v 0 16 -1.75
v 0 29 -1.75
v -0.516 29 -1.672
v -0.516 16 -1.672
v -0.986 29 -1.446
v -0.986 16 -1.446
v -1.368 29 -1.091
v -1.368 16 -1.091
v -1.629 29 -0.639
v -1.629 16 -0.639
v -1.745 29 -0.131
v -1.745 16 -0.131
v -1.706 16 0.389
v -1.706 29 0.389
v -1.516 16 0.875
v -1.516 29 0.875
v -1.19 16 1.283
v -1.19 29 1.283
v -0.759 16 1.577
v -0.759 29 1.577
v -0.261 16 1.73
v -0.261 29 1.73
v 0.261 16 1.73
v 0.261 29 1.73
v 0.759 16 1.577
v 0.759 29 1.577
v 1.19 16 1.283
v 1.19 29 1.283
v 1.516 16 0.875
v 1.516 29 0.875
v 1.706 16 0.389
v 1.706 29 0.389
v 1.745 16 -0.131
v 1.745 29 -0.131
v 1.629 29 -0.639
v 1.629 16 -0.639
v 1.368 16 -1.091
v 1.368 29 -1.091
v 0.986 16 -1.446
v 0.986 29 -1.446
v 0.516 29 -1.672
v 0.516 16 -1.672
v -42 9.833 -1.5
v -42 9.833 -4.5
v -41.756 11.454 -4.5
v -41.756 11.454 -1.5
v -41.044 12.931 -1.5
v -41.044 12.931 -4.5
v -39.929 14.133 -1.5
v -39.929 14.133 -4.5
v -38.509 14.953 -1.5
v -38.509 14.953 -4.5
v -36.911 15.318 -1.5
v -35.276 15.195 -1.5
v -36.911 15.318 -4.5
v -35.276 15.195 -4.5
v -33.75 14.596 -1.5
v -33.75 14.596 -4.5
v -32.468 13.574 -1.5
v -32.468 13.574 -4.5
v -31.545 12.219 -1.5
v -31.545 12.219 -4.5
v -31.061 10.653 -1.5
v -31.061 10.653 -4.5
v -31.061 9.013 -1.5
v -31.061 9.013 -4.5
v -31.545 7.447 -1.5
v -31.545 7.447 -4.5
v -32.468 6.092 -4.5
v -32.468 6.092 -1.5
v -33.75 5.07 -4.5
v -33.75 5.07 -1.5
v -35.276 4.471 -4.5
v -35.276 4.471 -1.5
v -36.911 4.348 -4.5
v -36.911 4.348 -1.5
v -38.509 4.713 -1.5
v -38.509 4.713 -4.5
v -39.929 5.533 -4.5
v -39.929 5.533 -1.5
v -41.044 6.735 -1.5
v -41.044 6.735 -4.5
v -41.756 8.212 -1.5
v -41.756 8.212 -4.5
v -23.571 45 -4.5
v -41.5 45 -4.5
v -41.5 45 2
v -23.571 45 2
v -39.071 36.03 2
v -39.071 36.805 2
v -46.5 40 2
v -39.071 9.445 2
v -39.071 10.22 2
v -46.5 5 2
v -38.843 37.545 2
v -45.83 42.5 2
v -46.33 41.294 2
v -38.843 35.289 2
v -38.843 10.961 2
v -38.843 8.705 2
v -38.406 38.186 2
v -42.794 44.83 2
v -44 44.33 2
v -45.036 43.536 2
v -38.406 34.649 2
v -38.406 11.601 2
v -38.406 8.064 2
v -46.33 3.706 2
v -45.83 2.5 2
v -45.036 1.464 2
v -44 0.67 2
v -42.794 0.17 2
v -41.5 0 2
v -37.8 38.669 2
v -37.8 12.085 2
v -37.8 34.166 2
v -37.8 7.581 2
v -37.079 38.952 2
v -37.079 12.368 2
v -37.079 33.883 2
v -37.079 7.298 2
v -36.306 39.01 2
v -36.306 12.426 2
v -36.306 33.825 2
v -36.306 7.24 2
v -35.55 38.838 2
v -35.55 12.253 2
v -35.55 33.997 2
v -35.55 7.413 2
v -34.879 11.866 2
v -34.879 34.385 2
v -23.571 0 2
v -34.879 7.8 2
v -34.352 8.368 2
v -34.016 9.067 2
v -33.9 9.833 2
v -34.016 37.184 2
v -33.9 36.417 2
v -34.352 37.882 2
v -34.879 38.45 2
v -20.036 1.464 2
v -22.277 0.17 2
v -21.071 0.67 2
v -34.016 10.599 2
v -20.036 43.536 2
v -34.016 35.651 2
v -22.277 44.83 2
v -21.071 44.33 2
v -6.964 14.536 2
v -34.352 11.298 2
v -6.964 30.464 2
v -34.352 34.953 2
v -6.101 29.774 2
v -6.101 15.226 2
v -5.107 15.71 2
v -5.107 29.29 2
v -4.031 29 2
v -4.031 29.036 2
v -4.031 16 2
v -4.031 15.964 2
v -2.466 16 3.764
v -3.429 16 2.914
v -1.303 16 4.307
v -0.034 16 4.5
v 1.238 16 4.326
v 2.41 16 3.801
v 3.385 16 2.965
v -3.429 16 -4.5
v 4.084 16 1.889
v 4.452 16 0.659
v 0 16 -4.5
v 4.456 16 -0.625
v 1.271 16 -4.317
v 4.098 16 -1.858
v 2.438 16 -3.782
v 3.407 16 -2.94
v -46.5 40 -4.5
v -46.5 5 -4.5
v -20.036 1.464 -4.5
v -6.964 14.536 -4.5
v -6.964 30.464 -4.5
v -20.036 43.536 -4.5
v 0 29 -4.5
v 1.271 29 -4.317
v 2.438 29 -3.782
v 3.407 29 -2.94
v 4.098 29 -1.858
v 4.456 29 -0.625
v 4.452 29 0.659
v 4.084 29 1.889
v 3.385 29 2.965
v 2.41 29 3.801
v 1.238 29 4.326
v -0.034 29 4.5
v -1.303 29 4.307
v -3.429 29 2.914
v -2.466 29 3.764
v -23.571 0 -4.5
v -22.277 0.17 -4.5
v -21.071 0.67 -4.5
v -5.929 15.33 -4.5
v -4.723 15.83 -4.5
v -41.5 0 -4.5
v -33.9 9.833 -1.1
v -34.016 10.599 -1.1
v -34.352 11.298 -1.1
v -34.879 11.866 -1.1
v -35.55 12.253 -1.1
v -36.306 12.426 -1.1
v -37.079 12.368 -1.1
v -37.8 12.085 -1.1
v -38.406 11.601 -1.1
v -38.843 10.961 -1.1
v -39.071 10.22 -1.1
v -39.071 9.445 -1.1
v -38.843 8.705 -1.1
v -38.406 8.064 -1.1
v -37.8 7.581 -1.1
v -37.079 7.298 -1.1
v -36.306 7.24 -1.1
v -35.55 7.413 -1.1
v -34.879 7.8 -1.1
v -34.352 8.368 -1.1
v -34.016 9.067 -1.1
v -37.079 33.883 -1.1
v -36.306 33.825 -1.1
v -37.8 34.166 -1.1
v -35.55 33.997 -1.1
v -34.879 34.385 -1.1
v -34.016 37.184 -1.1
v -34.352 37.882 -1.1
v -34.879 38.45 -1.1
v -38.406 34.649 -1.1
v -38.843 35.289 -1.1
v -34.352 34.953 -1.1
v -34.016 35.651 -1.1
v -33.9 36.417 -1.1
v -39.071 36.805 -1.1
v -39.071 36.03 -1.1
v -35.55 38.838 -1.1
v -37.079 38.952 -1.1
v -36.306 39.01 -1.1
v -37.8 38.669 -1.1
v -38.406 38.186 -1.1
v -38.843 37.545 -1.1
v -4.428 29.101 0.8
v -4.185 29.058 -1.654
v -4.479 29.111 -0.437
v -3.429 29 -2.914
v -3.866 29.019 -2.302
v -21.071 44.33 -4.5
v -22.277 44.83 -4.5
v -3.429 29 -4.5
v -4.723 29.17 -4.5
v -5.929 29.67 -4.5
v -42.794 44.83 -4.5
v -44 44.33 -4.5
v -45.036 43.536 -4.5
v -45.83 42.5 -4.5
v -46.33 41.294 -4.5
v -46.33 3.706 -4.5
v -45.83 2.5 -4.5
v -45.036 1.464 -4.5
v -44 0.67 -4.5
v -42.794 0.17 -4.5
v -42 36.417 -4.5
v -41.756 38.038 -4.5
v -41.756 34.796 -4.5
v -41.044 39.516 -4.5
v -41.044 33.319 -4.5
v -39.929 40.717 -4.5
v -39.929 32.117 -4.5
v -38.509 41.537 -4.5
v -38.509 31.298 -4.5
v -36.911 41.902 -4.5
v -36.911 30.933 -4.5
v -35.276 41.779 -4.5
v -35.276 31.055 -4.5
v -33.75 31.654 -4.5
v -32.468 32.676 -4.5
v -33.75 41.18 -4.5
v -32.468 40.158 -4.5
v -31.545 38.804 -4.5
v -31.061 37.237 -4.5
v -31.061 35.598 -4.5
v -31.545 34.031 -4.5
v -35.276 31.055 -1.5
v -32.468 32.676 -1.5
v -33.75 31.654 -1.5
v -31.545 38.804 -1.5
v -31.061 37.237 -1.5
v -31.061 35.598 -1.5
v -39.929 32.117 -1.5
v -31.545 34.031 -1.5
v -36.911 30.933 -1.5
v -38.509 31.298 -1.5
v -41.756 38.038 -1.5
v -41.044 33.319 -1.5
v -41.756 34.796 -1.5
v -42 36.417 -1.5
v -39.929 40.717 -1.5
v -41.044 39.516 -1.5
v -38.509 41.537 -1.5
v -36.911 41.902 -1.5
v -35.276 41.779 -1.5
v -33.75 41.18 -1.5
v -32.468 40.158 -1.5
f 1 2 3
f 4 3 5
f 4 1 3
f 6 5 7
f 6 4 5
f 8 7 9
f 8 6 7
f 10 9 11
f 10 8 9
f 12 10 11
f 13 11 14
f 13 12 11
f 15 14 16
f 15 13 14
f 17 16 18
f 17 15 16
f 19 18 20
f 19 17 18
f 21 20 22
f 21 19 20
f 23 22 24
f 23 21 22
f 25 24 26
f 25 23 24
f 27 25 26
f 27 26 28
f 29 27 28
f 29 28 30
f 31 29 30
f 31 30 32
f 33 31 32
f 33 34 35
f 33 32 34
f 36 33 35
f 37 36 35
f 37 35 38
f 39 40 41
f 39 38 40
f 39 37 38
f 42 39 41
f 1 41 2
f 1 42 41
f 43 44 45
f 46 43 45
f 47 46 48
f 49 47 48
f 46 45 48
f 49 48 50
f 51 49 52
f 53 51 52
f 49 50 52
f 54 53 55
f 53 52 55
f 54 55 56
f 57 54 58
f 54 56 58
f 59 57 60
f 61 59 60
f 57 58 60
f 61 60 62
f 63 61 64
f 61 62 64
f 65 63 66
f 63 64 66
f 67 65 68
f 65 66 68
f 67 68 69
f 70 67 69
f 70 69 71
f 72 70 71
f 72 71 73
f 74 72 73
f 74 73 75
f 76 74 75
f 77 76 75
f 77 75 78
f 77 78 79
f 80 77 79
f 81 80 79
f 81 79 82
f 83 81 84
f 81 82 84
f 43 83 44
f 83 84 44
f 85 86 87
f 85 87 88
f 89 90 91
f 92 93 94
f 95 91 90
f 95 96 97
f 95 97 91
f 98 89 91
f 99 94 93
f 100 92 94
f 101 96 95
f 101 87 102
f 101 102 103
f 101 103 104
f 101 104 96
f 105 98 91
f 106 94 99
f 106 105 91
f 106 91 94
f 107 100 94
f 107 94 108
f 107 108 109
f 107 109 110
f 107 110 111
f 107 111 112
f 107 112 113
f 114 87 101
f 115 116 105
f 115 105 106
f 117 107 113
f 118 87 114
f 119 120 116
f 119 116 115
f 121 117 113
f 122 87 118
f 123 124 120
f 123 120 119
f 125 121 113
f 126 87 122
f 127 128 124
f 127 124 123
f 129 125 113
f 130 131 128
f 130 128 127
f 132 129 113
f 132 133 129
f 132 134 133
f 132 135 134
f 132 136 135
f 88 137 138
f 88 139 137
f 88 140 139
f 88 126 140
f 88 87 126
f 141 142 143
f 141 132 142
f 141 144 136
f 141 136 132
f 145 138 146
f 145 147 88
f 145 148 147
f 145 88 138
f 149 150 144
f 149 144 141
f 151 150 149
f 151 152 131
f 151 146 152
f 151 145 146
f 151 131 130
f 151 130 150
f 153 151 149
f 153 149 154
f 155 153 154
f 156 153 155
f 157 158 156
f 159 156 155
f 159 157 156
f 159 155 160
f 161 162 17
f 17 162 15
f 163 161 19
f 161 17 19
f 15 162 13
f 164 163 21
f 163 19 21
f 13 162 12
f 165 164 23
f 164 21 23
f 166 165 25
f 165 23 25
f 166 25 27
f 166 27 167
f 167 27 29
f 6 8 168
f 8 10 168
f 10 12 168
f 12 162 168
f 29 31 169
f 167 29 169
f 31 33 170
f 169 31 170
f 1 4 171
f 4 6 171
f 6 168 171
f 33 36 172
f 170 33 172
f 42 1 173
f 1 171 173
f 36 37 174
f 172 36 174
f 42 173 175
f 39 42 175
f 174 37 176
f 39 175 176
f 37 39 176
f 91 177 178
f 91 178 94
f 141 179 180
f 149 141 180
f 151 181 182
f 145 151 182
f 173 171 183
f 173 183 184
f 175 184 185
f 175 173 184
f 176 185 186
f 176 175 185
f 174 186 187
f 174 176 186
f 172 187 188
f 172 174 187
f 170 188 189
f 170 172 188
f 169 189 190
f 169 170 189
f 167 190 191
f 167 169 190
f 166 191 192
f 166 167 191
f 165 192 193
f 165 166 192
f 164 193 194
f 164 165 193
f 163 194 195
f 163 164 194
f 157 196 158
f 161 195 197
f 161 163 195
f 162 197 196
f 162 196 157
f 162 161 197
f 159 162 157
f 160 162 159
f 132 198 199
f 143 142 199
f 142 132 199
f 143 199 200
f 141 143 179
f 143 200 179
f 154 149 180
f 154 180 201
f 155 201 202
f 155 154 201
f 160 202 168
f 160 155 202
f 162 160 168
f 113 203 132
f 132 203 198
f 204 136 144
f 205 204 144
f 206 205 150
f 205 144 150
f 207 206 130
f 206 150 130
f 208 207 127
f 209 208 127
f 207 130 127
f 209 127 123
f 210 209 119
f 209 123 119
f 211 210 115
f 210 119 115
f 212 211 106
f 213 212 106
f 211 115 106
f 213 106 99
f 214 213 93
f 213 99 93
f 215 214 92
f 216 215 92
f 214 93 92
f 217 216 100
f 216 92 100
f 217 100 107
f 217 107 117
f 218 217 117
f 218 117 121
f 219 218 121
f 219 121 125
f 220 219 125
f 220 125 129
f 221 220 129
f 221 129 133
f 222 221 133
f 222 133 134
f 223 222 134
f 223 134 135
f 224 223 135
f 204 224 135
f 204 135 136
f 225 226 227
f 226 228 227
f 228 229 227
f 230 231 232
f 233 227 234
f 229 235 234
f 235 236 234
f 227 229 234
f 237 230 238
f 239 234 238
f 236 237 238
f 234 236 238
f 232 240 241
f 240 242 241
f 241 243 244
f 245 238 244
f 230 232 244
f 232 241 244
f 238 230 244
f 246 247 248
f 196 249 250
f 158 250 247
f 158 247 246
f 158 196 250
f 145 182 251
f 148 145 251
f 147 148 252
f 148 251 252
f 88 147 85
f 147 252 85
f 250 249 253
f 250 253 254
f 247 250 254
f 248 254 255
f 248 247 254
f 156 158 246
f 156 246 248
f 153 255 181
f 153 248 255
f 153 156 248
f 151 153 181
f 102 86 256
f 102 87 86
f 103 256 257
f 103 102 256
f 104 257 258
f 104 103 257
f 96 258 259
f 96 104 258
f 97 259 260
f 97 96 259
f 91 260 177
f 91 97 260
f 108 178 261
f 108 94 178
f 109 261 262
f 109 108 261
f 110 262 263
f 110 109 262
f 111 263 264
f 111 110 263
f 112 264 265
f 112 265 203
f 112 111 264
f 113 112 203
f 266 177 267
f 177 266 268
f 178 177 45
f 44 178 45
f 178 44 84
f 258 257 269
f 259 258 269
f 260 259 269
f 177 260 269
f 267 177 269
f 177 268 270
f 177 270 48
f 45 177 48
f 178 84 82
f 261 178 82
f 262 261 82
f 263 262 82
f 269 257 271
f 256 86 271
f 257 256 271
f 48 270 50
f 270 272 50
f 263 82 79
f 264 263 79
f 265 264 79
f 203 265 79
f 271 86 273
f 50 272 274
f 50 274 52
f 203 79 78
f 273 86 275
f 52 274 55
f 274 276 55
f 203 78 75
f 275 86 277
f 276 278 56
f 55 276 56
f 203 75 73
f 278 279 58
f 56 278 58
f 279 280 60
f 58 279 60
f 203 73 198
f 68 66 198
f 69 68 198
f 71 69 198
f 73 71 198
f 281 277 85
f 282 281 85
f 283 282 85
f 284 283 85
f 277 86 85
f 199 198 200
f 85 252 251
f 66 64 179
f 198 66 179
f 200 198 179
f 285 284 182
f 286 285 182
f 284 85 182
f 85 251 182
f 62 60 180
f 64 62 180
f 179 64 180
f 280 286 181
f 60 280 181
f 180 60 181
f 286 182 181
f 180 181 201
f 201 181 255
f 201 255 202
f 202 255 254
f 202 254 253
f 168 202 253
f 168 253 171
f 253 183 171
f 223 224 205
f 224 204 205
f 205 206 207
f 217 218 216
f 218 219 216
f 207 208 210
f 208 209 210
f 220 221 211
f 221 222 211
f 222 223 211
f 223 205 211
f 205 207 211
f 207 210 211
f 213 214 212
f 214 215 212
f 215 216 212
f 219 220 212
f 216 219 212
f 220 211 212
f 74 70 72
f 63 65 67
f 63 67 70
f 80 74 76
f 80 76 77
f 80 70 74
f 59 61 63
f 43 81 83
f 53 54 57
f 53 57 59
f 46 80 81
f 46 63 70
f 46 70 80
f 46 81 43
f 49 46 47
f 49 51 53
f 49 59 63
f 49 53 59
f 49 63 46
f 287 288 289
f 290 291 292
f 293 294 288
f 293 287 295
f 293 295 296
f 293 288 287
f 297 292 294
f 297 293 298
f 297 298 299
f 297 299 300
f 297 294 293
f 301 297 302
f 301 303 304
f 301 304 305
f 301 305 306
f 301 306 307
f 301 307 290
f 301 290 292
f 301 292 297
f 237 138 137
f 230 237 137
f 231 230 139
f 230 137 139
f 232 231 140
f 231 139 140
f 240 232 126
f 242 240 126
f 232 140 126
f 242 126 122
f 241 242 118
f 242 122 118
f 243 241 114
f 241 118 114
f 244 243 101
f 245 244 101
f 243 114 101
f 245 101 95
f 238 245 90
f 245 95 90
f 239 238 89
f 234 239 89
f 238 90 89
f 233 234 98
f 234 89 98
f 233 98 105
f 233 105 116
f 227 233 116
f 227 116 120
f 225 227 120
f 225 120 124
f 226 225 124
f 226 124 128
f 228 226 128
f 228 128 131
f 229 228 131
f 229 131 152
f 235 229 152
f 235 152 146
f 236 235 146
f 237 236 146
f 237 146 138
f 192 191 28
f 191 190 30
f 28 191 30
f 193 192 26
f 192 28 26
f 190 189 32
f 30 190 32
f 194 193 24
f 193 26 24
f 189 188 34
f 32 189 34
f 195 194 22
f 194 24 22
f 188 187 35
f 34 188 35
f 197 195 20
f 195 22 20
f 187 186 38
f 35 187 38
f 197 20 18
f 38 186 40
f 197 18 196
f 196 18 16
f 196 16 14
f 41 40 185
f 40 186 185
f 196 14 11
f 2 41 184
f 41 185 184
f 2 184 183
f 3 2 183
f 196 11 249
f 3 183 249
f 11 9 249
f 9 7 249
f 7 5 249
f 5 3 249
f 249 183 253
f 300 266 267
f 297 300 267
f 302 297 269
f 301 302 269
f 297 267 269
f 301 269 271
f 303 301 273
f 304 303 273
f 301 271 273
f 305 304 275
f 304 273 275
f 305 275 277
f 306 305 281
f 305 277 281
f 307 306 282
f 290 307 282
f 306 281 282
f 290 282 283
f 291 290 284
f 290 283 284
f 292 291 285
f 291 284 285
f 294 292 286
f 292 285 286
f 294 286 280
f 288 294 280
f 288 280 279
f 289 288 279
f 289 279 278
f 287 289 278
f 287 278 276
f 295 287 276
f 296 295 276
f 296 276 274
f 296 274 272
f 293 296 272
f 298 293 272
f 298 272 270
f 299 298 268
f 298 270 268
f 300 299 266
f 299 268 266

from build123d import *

# Parameters (mm, degrees)
BOSS_EXTRUDE1_DEPTH = 45
BOSS_EXTRUDE2_START = 16
SKETCH1_3_R         = 4.5
SKETCH1_3_R_2       = 1.75
BOSS_EXTRUDE2_DEPTH = 13
CUT_EXTRUDE1_START  = 16
SKETCH5_R           = 5.5
CUT_EXTRUDE1_DEPTH  = 25
SKETCH6_R           = 2.6
CUT_EXTRUDE2_DEPTH  = 15
CUT_EXTRUDE4_START  = 49.4
SKETCH5_4_R         = 5.5
CUT_EXTRUDE4_DEPTH  = 20.4
FILLET1_R           = 0.5
FILLET2_R           = 5
SKETCH7_R           = 5.5
CUT_EXTRUDE3_DEPTH  = 3
SKETCH8_R           = 3.001117943
SKETCH8_R_2         = 3.734433125
BOSS_EXTRUDE5_DEPTH = 0.4
SKETCH9_W           = 2.236067978
SKETCH9_H           = 16
CUT_EXTRUDE5_DEPTH  = 10
FILLET4_R           = 5


with BuildPart() as part:
    # Sketch1 → Boss-Extrude1 (new body)
    with BuildSketch(Plane(origin=(0, 0, 0), x_dir=(1, 0, 0), z_dir=(0, 1, 0))):
        with BuildLine():
            Line((-46.5, 4.5), (-46.5, -2))
            Line((-46.5, -2), (-4.031128874, -2))
            ThreePointArc((-4.031128874, -2), (-3.824264635, 2.371708245), (0, 4.5))
            Line((0, 4.5), (-46.5, 4.5))
        make_face()
    extrude(amount=BOSS_EXTRUDE1_DEPTH)

    # Sketch1<3> → Boss-Extrude2 (add)
    # profile 1 of 2: a face of its own
    with BuildSketch(Plane(origin=(0, 0, 0), x_dir=(1, 0, 0), z_dir=(0, 1, 0)).offset(BOSS_EXTRUDE2_START)):
        Circle(SKETCH1_3_R)
        Polygon((-2.857883832, -1.65), (0, -3.3), (2.857883832, -1.65), (2.857883832, 1.65), (0, 3.3), (-2.857883832, 1.65), align=None, mode=Mode.SUBTRACT)
    # profile 2 of 2: a face of its own
    with BuildSketch(Plane(origin=(0, 0, 0), x_dir=(1, 0, 0), z_dir=(0, 1, 0)).offset(BOSS_EXTRUDE2_START)):
        Polygon((-2.857883832, 1.65), (-2.857883832, -1.65), (0, -3.3), (2.857883832, -1.65), (2.857883832, 1.65), (0, 3.3), align=None)
        with Locations(Location((0, 0, 0), (0, 0, 90))):
            Circle(SKETCH1_3_R_2, mode=Mode.SUBTRACT)
    extrude(amount=BOSS_EXTRUDE2_DEPTH)

    # Sketch5 → Cut-Extrude1 (cut)
    with BuildSketch(Plane(origin=(0, 0, 0), x_dir=(1, 0, 0), z_dir=(0, 1, 0)).offset(CUT_EXTRUDE1_START)):
        Circle(SKETCH5_R)
    extrude(amount=-CUT_EXTRUDE1_DEPTH, mode=Mode.SUBTRACT)

    # Sketch6 → Cut-Extrude2 (cut)
    with BuildSketch(Plane.XY.offset(2)):
        with Locations((-36.5, 36.417335992)):
            Circle(SKETCH6_R)
        with Locations((-36.5, 9.832941716)):
            Circle(SKETCH6_R)
    extrude(amount=-CUT_EXTRUDE2_DEPTH, mode=Mode.SUBTRACT)

    # Sketch5<4> → Cut-Extrude4 (cut)
    with BuildSketch(Plane(origin=(0, 0, 0), x_dir=(1, 0, 0), z_dir=(0, 1, 0)).offset(CUT_EXTRUDE4_START)):
        Circle(SKETCH5_4_R)
    extrude(amount=-CUT_EXTRUDE4_DEPTH, mode=Mode.SUBTRACT)

    # Fillet1
    fillet1_edges = [part.edges().sort_by_distance(p)[0] for p in [
        (-3.16227766, 8, -4.5),
    ]]
    fillet(fillet1_edges, radius=FILLET1_R)

    # Fillet2
    fillet2_edges = [part.edges().sort_by_distance(p)[0] for p in [
        (-46.5, 45, -1.25),
        (-46.5, 0, -1.25),
    ]]
    fillet(fillet2_edges, radius=FILLET2_R)

    # Sketch7 → Cut-Extrude3 (cut)
    with BuildSketch(Plane(origin=(0, 0, -4.5), x_dir=(-1, 0, 0), z_dir=(0, 0, -1))):
        with Locations((36.5, 36.417335992)):
            Circle(SKETCH7_R)
        with Locations((36.5, 9.832941716)):
            Circle(SKETCH7_R)
    extrude(amount=-CUT_EXTRUDE3_DEPTH, mode=Mode.SUBTRACT)

    # Sketch8 → Boss-Extrude5 (add)
    with BuildSketch(Plane(origin=(0, 0, -1.5), x_dir=(-1, 0, 0), z_dir=(0, 0, -1))):
        with Locations((36.5, 36.417335992)):
            Circle(SKETCH8_R)
        with Locations((36.5, 9.832941716)):
            Circle(SKETCH8_R_2)
    extrude(amount=-BOSS_EXTRUDE5_DEPTH)

    # Sketch9 → Cut-Extrude5 (cut)
    with BuildSketch(Plane(origin=(0, 0, -4.5), x_dir=(-1, 0, 0), z_dir=(0, 0, -1))):
        Polygon((5.5, 16), (4.472135955, 16), (4.472135955, 0), (21.5, 0), align=None)
        with Locations((3.354101966, 8)):
            Rectangle(SKETCH9_W, SKETCH9_H)
        Polygon((3.16227766, 29), (3.16227766, 45), (-0.050353192, 45), (-0.050353192, 29), (0, 29), align=None)
        Polygon((5.5, 29), (21.5, 45), (3.16227766, 45), (3.16227766, 29), align=None)
    extrude(amount=-CUT_EXTRUDE5_DEPTH, mode=Mode.SUBTRACT)

    # Fillet4
    # the kernel refuses this fillet: 5 mm, written as the material it adds along each edge
    with BuildSketch(Plane(origin=(-5.5, 29, 7.17766953), x_dir=(-0.7071067811865427, 0.7071067811865525, 0), z_dir=(0, 0, -1))) as fillet4_piece_1_section:
        with BuildLine():
            CenterArc((FILLET4_R * 0.414213562373, FILLET4_R), FILLET4_R, 225, 45)
            Line((-FILLET4_R * 0.292893218813, FILLET4_R * 0.292893218813), (0, 0))
            Line((0, 0), (FILLET4_R * 0.414213562373, 0))
        make_face()
    fillet4_piece_1 = extrude(amount=16.855339059, mode=Mode.PRIVATE)
    fillet4_piece_1 = fillet4_piece_1 & Plane(origin=(0, 29.007513744, 0), x_dir=(1, 0, 0), z_dir=(0, -1, 0)) * Cylinder(4.5, 42, mode=Mode.PRIVATE)
    add(fillet4_piece_1)
    with BuildSketch(Plane(origin=(-5.5, 29, 2), x_dir=(-0.7071067811865431, 0.7071067811865518, 0), z_dir=(0, 0, -1)), Plane(origin=(-5.5, 16, 2), x_dir=(1, 0, 0), z_dir=(0, 0, -1))) as fillet4_piece_2:
        with BuildLine():
            CenterArc((FILLET4_R * 0.414213562373, FILLET4_R), FILLET4_R, 225, 45)
            Line((-FILLET4_R * 0.292893218813, FILLET4_R * 0.292893218813), (0, 0))
            Line((0, 0), (FILLET4_R * 0.414213562373, 0))
        make_face()
    extrude(amount=6.5)
    with BuildSketch(Plane(origin=(-5.5, 16, 7.17766953), x_dir=(1, 0, 0), z_dir=(0, 0, -1))) as fillet4_piece_3_section:
        with BuildLine():
            CenterArc((FILLET4_R * 0.414213562373, FILLET4_R), FILLET4_R, 225, 45)
            Line((-FILLET4_R * 0.292893218813, FILLET4_R * 0.292893218813), (0, 0))
            Line((0, 0), (FILLET4_R * 0.414213562373, 0))
        make_face()
    fillet4_piece_3 = extrude(amount=16.855339059, mode=Mode.PRIVATE)
    fillet4_piece_3 = fillet4_piece_3 & Plane(origin=(0, 15.992486256, 0), x_dir=(1, 0, 0), z_dir=(0, -1, 0)) * Cylinder(4.5, 42, mode=Mode.PRIVATE)
    add(fillet4_piece_3)
    # the kernel refuses this fillet: 5 mm, written as the material it takes off along each edge
    with BuildSketch(Plane(origin=(-21.5, 0, -9.67766953), x_dir=(0.7071067811865441, 0.7071067811865509, 0), z_dir=(0, 0, 1)), Plane(origin=(-21.5, 45, -9.67766953), x_dir=(-1, 0, 0), z_dir=(0, 0, 1))) as fillet4_2_piece_1:
        with BuildLine():
            CenterArc((FILLET4_R * 0.414213562373, FILLET4_R), FILLET4_R, 225, 45)
            Line((-FILLET4_R * 0.292893218813, FILLET4_R * 0.292893218813), (0, 0))
            Line((0, 0), (FILLET4_R * 0.414213562373, 0))
        make_face()
    extrude(amount=16.855339059, mode=Mode.SUBTRACT)


solid = part.part
